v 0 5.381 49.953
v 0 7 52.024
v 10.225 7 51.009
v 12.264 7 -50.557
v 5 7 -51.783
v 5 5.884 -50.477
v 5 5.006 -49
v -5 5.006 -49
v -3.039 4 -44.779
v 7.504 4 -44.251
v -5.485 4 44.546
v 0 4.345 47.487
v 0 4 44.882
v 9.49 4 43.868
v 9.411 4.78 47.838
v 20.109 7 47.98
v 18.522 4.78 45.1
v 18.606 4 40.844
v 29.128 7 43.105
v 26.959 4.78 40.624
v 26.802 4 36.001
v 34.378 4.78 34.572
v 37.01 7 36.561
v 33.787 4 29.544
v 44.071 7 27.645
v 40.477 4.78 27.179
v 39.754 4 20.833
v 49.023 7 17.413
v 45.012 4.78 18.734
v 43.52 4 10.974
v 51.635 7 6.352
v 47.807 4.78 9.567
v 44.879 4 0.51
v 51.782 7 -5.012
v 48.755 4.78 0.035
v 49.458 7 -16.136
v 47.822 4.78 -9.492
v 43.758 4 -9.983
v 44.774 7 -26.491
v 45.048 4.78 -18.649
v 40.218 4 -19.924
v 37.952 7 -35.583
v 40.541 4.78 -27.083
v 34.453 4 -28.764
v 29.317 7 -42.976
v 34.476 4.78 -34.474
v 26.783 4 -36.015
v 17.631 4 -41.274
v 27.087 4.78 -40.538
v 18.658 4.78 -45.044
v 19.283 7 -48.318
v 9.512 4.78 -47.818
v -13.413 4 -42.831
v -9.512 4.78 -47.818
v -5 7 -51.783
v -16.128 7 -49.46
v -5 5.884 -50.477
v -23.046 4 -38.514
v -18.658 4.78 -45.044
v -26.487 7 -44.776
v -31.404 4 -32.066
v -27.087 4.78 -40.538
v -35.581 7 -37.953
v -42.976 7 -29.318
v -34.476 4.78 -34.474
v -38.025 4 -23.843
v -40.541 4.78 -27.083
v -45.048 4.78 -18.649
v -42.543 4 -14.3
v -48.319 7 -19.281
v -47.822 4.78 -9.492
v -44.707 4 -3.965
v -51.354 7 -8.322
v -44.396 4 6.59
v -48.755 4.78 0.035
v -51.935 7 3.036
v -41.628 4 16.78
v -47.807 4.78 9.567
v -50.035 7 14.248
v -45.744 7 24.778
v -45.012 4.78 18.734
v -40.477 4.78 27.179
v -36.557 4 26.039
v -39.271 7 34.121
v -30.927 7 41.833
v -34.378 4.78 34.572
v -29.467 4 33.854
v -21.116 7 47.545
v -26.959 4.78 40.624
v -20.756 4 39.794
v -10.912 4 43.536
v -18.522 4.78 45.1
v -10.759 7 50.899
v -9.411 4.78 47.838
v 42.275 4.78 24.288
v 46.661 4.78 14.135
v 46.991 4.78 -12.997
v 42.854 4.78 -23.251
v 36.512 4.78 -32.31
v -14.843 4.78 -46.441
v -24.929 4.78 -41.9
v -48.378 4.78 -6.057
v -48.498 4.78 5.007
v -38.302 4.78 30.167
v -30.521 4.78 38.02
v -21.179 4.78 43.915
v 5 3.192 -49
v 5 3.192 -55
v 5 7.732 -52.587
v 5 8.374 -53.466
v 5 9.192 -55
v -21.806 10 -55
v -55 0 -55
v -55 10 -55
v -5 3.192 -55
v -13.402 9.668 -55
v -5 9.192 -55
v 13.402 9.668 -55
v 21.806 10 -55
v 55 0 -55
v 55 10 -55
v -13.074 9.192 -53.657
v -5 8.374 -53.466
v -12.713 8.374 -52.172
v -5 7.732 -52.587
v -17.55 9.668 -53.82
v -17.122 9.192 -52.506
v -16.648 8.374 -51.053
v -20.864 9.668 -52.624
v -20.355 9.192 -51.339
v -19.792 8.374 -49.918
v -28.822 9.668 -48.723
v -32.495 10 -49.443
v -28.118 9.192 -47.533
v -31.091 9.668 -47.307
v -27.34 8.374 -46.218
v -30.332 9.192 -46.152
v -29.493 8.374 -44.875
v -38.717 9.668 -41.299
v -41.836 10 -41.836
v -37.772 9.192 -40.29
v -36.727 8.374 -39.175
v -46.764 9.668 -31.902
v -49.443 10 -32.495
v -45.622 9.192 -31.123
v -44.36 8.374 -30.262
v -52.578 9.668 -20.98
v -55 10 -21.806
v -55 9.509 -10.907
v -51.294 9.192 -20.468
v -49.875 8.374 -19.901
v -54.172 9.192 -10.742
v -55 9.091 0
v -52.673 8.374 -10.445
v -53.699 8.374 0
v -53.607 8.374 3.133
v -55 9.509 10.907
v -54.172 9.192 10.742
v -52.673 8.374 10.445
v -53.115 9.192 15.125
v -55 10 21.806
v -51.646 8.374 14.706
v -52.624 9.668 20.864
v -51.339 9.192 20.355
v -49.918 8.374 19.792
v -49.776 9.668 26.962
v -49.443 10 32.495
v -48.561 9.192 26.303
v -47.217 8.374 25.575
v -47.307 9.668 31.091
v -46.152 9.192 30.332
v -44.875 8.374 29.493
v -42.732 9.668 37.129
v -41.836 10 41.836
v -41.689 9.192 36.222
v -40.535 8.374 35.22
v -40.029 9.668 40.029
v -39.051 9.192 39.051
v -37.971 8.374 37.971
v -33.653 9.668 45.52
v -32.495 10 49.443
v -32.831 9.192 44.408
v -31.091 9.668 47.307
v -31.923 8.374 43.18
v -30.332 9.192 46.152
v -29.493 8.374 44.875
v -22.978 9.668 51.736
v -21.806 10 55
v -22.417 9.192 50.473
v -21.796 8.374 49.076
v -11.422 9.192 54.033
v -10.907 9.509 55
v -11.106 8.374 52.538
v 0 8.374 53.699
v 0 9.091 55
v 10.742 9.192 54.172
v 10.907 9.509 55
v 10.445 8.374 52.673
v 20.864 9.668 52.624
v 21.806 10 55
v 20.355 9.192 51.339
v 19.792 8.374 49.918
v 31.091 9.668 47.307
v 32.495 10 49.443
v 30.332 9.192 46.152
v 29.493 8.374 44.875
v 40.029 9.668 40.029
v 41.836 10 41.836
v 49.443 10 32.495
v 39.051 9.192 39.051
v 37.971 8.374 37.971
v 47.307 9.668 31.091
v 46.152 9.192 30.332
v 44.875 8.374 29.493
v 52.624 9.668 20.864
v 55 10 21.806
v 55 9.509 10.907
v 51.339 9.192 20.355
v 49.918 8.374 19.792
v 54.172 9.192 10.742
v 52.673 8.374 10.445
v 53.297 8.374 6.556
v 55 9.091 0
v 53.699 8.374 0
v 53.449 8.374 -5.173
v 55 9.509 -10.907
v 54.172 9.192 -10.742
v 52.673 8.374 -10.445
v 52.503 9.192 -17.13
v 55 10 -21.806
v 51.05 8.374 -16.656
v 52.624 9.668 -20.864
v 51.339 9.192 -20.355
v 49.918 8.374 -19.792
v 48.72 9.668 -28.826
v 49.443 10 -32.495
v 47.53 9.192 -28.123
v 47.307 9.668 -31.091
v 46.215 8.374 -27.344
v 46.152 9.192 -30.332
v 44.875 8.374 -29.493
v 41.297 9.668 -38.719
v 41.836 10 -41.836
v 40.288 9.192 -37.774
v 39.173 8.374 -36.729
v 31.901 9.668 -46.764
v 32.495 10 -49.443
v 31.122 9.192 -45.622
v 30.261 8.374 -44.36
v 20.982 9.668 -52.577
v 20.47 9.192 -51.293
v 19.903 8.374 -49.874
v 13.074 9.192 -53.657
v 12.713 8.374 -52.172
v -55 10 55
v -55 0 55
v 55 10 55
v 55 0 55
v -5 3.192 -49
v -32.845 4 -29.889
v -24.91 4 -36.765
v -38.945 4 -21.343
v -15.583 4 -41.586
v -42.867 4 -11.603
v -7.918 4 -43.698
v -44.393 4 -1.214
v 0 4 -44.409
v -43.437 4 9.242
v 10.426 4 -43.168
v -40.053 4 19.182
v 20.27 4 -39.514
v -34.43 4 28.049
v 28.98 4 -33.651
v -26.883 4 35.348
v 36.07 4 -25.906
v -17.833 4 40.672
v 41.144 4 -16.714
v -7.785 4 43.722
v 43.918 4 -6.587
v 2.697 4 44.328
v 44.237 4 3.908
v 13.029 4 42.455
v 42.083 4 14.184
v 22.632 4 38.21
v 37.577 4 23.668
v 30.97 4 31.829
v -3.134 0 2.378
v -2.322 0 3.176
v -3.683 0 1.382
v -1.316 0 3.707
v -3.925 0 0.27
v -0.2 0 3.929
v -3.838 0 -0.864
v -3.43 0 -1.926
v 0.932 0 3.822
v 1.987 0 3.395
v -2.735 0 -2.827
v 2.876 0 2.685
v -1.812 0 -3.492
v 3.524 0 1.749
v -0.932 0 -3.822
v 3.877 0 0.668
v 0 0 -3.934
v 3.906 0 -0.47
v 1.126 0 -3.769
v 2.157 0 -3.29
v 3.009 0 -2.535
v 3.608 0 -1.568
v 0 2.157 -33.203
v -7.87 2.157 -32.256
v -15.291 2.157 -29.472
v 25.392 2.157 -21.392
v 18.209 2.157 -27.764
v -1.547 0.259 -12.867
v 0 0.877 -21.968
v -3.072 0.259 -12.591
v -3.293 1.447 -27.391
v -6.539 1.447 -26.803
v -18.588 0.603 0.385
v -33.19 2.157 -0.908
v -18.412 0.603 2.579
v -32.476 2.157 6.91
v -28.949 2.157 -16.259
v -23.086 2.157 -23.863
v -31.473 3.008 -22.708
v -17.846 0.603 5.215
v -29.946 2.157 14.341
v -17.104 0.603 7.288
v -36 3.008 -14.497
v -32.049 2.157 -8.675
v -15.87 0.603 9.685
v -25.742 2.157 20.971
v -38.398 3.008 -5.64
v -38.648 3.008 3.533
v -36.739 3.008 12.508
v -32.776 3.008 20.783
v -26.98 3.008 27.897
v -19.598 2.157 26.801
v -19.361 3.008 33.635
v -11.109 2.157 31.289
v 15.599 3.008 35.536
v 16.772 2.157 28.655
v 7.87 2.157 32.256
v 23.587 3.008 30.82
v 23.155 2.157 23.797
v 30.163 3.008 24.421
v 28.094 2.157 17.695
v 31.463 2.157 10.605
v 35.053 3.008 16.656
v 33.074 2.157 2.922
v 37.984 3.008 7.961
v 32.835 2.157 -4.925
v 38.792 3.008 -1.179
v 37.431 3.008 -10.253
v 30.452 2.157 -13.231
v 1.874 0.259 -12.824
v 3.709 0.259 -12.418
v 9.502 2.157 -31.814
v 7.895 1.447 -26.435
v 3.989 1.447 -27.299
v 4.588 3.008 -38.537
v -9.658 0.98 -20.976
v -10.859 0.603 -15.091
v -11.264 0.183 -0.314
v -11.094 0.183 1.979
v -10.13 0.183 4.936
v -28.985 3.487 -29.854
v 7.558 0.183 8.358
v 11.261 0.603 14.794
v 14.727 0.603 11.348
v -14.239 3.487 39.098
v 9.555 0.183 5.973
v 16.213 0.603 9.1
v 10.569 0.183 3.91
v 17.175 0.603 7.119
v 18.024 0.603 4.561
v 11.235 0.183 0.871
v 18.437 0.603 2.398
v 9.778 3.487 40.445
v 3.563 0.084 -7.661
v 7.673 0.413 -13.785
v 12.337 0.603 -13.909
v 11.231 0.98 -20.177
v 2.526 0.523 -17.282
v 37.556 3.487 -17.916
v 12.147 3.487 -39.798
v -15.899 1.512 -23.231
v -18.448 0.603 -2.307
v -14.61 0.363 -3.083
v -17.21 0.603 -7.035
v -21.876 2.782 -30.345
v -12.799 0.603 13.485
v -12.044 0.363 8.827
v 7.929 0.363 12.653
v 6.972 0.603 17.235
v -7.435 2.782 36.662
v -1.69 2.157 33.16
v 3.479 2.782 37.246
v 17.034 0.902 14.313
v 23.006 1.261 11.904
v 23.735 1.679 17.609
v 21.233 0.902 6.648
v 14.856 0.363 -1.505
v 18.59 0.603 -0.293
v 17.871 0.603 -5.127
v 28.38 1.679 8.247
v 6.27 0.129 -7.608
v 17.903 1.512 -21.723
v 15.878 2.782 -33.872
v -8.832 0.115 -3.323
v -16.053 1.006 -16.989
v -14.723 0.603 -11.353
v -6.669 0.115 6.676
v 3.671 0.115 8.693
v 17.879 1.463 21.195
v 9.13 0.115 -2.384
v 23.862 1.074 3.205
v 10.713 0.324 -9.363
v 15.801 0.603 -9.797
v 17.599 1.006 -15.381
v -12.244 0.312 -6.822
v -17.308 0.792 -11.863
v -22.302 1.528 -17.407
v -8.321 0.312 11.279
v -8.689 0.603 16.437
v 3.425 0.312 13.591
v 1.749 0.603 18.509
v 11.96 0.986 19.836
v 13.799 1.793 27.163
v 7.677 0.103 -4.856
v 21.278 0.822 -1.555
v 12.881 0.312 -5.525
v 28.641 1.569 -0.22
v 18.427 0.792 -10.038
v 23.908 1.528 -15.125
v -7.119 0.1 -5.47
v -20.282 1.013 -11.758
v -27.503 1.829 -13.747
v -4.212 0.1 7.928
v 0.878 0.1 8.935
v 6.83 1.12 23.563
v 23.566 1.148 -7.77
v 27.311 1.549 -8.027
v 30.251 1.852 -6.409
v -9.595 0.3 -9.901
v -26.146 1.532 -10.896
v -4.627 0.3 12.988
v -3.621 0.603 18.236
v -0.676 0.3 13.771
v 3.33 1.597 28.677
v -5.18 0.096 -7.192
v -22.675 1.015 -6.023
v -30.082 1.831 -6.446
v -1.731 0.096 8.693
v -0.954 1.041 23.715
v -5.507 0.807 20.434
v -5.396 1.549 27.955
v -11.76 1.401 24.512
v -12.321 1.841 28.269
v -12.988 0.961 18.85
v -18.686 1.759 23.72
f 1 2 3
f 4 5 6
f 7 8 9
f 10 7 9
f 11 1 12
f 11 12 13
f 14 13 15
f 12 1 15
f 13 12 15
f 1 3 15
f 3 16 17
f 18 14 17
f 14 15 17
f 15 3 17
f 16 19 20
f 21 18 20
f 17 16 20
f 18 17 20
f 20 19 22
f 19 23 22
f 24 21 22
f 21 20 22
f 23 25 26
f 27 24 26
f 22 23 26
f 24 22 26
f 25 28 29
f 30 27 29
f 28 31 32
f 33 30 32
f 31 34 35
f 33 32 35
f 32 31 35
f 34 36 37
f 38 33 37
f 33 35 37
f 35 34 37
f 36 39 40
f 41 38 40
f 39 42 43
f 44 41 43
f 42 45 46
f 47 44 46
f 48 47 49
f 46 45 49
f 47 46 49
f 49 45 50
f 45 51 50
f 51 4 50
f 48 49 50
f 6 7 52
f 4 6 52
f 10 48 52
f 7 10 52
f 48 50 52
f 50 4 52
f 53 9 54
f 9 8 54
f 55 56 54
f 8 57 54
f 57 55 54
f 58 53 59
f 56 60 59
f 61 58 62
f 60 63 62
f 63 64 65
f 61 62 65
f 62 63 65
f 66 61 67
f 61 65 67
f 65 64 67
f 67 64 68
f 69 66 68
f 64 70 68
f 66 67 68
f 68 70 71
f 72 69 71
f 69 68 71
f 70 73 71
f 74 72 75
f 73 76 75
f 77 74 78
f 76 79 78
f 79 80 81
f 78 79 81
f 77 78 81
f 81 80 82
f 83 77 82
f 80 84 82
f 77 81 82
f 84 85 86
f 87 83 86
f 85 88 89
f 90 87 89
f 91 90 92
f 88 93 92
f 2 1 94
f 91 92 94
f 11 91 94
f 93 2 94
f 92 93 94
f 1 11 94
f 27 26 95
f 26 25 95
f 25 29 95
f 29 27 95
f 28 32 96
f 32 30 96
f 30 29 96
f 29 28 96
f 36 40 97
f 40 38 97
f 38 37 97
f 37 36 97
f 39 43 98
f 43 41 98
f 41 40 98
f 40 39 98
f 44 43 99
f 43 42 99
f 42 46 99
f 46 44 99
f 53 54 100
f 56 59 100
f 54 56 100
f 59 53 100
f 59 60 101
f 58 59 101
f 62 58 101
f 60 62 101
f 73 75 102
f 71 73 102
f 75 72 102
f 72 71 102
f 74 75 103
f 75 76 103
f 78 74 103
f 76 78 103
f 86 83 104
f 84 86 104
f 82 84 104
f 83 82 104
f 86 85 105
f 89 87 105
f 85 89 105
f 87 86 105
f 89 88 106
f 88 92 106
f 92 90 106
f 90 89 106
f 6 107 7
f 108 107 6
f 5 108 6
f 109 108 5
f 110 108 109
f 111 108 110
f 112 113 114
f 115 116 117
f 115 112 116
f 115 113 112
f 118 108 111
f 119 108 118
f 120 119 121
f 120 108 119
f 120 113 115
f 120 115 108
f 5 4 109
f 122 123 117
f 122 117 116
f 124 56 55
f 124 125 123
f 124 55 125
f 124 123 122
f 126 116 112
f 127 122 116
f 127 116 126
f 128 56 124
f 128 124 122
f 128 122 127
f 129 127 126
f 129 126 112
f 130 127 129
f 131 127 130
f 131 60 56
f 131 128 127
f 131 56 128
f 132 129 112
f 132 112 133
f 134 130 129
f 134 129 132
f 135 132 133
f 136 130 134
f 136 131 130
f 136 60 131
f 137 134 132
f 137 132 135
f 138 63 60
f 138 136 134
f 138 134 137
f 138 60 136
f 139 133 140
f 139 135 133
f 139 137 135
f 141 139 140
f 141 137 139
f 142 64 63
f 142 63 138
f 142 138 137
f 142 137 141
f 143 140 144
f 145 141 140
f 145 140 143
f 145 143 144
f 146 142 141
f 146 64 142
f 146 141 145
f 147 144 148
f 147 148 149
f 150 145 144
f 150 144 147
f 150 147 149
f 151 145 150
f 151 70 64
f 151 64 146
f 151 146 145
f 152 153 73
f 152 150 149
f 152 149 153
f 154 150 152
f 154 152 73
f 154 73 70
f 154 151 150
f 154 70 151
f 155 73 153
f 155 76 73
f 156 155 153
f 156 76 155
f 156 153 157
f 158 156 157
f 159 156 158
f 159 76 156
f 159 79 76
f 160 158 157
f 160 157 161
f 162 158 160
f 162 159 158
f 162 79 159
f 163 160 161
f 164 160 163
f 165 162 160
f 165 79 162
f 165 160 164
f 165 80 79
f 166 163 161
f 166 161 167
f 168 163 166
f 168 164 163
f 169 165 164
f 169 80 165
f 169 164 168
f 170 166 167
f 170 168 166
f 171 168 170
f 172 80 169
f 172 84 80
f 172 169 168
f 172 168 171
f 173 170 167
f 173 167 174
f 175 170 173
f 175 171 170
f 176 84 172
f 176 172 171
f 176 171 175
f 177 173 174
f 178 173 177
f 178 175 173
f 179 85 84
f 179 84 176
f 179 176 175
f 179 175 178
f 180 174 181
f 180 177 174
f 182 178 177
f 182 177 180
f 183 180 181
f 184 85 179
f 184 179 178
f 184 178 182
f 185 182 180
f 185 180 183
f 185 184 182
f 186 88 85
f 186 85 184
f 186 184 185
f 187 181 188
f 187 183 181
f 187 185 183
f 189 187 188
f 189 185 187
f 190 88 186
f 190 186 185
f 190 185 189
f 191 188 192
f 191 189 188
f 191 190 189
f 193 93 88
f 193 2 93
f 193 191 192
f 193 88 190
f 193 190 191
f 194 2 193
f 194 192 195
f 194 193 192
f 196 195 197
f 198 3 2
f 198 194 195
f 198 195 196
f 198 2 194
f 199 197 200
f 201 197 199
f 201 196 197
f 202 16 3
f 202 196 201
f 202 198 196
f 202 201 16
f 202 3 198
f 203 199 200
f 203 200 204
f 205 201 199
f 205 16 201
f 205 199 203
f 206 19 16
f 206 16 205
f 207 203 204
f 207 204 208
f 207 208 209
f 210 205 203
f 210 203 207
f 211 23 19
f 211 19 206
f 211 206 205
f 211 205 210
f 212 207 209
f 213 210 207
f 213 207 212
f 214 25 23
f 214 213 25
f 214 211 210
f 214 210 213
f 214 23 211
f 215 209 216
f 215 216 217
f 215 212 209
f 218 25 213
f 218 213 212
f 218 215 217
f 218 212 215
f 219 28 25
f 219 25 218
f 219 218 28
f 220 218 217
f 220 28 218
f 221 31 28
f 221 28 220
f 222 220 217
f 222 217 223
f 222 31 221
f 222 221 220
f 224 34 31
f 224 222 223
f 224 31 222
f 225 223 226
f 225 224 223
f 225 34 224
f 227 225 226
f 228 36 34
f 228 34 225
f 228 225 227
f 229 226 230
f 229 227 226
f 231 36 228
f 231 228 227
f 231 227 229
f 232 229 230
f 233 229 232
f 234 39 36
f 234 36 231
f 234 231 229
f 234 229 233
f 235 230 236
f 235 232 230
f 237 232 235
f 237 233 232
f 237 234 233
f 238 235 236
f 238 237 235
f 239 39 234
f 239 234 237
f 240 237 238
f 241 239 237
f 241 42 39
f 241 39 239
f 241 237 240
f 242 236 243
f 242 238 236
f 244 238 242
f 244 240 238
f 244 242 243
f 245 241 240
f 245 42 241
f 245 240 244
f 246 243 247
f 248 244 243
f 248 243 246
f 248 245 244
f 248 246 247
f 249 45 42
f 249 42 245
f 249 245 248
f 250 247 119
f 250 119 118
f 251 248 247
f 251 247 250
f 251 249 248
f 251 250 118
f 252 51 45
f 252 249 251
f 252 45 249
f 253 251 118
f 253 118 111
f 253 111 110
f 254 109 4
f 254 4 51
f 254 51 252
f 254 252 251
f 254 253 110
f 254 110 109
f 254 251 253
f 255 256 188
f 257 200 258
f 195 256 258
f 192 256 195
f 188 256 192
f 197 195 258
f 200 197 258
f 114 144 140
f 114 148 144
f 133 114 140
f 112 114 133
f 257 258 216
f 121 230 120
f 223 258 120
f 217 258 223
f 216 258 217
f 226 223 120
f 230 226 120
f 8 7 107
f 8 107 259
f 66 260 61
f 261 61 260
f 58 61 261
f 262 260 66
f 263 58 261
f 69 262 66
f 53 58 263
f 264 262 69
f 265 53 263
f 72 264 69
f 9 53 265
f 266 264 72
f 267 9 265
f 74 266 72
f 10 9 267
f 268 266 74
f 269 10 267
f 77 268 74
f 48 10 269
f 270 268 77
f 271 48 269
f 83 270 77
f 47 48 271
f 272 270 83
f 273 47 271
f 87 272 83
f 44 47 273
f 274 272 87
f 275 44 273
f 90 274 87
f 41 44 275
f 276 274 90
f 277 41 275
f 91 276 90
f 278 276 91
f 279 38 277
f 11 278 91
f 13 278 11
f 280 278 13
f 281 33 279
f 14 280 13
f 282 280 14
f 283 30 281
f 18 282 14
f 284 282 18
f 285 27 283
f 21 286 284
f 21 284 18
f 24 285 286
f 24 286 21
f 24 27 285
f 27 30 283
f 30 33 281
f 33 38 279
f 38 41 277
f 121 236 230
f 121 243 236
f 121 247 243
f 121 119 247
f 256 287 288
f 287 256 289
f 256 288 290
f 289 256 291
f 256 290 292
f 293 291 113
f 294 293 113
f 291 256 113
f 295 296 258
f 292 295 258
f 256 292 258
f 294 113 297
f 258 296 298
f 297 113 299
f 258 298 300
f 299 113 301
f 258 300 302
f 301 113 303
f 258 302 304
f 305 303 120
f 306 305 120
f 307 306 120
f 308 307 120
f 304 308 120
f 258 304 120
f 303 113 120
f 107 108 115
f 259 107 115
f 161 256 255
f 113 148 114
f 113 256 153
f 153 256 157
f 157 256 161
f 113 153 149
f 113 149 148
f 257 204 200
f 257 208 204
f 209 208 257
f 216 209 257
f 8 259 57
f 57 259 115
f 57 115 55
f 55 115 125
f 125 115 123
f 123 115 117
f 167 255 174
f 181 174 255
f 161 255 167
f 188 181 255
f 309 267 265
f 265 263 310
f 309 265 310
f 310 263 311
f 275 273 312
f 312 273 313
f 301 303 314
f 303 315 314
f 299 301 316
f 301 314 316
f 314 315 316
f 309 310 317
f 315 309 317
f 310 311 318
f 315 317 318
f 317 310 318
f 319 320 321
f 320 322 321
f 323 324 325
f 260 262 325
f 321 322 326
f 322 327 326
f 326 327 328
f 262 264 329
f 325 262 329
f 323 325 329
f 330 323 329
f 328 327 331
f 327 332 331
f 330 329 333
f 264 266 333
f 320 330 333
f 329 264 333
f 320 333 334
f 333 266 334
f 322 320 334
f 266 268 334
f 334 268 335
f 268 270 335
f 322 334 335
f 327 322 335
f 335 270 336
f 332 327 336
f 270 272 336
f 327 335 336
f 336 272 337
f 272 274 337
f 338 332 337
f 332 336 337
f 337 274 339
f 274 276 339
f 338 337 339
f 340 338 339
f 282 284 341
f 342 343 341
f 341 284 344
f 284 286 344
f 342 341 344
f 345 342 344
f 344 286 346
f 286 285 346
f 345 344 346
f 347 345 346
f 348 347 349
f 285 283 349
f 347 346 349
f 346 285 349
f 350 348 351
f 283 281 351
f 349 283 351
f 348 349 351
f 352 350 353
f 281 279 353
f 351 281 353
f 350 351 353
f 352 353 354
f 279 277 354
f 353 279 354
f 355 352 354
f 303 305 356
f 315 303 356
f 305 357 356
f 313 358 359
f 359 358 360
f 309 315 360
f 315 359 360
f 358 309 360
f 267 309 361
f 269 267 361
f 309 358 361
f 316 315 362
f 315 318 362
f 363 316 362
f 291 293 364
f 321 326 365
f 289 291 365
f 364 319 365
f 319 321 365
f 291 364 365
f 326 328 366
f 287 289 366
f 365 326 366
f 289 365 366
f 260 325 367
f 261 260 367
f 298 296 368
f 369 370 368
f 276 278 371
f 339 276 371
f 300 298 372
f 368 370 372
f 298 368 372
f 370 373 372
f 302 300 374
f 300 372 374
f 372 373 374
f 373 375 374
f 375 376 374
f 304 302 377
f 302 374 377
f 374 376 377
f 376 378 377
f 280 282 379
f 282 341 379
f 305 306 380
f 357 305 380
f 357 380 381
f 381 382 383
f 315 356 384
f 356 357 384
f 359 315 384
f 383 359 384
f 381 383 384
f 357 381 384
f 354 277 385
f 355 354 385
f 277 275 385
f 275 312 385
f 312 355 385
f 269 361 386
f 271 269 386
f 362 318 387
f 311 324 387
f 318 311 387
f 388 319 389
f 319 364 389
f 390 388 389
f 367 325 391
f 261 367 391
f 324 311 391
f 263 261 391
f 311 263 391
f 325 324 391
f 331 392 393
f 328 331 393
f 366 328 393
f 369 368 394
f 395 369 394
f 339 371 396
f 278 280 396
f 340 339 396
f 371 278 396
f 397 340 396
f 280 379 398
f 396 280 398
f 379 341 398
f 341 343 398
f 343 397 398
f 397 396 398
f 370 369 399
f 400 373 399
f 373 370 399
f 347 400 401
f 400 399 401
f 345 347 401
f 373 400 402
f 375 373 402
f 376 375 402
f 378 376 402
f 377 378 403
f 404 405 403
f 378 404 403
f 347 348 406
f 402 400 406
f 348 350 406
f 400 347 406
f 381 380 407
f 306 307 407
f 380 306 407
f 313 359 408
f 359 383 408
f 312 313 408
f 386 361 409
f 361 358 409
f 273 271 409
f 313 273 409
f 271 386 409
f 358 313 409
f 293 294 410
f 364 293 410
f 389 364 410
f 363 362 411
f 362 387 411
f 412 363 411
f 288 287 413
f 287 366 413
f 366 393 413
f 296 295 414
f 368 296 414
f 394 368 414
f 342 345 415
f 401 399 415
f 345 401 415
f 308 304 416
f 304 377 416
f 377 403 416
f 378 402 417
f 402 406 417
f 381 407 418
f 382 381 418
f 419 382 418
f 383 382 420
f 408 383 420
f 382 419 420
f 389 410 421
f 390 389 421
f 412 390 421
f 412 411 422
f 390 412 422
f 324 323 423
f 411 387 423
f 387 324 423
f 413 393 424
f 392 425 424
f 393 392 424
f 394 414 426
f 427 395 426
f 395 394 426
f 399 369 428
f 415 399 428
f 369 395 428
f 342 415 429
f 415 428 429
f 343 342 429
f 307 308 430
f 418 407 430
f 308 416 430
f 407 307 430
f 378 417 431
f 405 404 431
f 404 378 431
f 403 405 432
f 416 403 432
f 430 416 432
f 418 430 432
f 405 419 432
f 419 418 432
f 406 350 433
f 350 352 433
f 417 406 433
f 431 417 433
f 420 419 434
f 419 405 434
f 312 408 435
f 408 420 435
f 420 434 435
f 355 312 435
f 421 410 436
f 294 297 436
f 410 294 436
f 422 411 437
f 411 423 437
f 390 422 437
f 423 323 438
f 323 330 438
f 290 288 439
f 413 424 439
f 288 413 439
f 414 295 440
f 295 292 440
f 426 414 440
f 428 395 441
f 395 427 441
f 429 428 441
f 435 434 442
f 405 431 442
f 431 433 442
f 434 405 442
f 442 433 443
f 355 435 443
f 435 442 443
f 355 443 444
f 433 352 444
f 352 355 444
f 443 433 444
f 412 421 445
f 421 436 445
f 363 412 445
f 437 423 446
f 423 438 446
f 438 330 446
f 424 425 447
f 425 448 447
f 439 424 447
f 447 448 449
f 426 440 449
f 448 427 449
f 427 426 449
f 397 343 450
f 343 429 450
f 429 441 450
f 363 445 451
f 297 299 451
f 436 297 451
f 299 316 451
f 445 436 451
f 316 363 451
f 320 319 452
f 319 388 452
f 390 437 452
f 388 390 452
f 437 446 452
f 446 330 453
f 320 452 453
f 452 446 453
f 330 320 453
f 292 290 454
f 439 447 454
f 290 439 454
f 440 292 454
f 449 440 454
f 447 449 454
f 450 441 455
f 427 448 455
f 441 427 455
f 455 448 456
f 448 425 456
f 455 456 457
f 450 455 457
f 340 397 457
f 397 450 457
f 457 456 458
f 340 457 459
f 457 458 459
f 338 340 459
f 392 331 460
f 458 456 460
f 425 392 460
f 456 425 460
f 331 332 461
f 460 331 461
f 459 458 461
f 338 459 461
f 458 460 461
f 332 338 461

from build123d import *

# Parameters (mm, degrees)
SKETCH1_W           = 110
SKETCH1_H           = 110
BOSS_EXTRUDE1_DEPTH = 10
SKETCH2_R           = 50
CUT_EXTRUDE1_DEPTH  = 6
FILLET1_R           = 10
FILLET2_R           = 10
SKETCH4_W           = 10
SKETCH4_H           = 6
CUT_EXTRUDE2_DEPTH  = 6


with BuildPart() as part:
    # Sketch1 → Boss-Extrude1 (new body)
    with BuildSketch(Plane(origin=(0, 0, 0), x_dir=(1, 0, 0), z_dir=(0, 1, 0))):
        Rectangle(SKETCH1_W, SKETCH1_H)
    extrude(amount=BOSS_EXTRUDE1_DEPTH)

    # Sketch2 → Cut-Extrude1 (cut)
    with BuildSketch(Plane(origin=(0, 10, 0), x_dir=(1, 0, 0), z_dir=(0, 1, 0))):
        with Locations(Location((0, 0, 0), (0, 0, 270))):
            Circle(SKETCH2_R)
    extrude(amount=-CUT_EXTRUDE1_DEPTH, mode=Mode.SUBTRACT)

    # Fillet1
    # the kernel refuses this fillet: 10 mm, written as the material it takes off along each edge
    with BuildSketch(Plane(origin=(0, 10, 0), x_dir=(0, 0, 1), z_dir=(-1, 0, 0))) as fillet1_piece_1:
        with BuildLine():
            CenterArc((59.16515139, -10), FILLET1_R, 90, 66.421821522)
            Line((50, -6), (50, 0))
            Line((50, 0), (59.16515139, 0))
        make_face()
    revolve(axis=Axis((0, 10, 0), (0, 1, 0)), mode=Mode.SUBTRACT)

    # Fillet2
    fillet2_edges = [part.edges().sort_by_distance(p)[0] for p in [
        (0, 4, -50),
    ]]
    fillet(fillet2_edges, radius=FILLET2_R)

    # Sketch3 → Cut-Revolve3 (revolve, cut)
    with BuildSketch(Plane(origin=(0, 0, 0), x_dir=(0, 0, -1), z_dir=(1, 0, 0)), mode=Mode.PRIVATE) as cut_revolve3_sk:
        with BuildLine():
            Line((0, 0), (0, 10.285805254))
            Line((0, 10.285805254), (-44.639424331, 4.043757306))
            add(Edge.make_bspline(
                [(0, 0), (-22.429529075, -0.19444877), (-44.639424331, 4.043757306)],
                knots=[0, 0, 0, 1, 1, 1], degree=2))
        make_face()
    revolve(cut_revolve3_sk.sketch.rotate(Axis((0, 0, 0), (0, 1, 0)), 180), axis=Axis((0, 0, 0), (0, 1, 0)), mode=Mode.SUBTRACT)

    # Sketch4 → Cut-Extrude2 (cut)
    with BuildSketch(Plane(origin=(0, 0, -55), x_dir=(-1, 0, 0), z_dir=(0, 0, -1))):
        with Locations((0, 6.191841145)):
            Rectangle(SKETCH4_W, SKETCH4_H)
    extrude(amount=-CUT_EXTRUDE2_DEPTH, mode=Mode.SUBTRACT)


solid = part.part
